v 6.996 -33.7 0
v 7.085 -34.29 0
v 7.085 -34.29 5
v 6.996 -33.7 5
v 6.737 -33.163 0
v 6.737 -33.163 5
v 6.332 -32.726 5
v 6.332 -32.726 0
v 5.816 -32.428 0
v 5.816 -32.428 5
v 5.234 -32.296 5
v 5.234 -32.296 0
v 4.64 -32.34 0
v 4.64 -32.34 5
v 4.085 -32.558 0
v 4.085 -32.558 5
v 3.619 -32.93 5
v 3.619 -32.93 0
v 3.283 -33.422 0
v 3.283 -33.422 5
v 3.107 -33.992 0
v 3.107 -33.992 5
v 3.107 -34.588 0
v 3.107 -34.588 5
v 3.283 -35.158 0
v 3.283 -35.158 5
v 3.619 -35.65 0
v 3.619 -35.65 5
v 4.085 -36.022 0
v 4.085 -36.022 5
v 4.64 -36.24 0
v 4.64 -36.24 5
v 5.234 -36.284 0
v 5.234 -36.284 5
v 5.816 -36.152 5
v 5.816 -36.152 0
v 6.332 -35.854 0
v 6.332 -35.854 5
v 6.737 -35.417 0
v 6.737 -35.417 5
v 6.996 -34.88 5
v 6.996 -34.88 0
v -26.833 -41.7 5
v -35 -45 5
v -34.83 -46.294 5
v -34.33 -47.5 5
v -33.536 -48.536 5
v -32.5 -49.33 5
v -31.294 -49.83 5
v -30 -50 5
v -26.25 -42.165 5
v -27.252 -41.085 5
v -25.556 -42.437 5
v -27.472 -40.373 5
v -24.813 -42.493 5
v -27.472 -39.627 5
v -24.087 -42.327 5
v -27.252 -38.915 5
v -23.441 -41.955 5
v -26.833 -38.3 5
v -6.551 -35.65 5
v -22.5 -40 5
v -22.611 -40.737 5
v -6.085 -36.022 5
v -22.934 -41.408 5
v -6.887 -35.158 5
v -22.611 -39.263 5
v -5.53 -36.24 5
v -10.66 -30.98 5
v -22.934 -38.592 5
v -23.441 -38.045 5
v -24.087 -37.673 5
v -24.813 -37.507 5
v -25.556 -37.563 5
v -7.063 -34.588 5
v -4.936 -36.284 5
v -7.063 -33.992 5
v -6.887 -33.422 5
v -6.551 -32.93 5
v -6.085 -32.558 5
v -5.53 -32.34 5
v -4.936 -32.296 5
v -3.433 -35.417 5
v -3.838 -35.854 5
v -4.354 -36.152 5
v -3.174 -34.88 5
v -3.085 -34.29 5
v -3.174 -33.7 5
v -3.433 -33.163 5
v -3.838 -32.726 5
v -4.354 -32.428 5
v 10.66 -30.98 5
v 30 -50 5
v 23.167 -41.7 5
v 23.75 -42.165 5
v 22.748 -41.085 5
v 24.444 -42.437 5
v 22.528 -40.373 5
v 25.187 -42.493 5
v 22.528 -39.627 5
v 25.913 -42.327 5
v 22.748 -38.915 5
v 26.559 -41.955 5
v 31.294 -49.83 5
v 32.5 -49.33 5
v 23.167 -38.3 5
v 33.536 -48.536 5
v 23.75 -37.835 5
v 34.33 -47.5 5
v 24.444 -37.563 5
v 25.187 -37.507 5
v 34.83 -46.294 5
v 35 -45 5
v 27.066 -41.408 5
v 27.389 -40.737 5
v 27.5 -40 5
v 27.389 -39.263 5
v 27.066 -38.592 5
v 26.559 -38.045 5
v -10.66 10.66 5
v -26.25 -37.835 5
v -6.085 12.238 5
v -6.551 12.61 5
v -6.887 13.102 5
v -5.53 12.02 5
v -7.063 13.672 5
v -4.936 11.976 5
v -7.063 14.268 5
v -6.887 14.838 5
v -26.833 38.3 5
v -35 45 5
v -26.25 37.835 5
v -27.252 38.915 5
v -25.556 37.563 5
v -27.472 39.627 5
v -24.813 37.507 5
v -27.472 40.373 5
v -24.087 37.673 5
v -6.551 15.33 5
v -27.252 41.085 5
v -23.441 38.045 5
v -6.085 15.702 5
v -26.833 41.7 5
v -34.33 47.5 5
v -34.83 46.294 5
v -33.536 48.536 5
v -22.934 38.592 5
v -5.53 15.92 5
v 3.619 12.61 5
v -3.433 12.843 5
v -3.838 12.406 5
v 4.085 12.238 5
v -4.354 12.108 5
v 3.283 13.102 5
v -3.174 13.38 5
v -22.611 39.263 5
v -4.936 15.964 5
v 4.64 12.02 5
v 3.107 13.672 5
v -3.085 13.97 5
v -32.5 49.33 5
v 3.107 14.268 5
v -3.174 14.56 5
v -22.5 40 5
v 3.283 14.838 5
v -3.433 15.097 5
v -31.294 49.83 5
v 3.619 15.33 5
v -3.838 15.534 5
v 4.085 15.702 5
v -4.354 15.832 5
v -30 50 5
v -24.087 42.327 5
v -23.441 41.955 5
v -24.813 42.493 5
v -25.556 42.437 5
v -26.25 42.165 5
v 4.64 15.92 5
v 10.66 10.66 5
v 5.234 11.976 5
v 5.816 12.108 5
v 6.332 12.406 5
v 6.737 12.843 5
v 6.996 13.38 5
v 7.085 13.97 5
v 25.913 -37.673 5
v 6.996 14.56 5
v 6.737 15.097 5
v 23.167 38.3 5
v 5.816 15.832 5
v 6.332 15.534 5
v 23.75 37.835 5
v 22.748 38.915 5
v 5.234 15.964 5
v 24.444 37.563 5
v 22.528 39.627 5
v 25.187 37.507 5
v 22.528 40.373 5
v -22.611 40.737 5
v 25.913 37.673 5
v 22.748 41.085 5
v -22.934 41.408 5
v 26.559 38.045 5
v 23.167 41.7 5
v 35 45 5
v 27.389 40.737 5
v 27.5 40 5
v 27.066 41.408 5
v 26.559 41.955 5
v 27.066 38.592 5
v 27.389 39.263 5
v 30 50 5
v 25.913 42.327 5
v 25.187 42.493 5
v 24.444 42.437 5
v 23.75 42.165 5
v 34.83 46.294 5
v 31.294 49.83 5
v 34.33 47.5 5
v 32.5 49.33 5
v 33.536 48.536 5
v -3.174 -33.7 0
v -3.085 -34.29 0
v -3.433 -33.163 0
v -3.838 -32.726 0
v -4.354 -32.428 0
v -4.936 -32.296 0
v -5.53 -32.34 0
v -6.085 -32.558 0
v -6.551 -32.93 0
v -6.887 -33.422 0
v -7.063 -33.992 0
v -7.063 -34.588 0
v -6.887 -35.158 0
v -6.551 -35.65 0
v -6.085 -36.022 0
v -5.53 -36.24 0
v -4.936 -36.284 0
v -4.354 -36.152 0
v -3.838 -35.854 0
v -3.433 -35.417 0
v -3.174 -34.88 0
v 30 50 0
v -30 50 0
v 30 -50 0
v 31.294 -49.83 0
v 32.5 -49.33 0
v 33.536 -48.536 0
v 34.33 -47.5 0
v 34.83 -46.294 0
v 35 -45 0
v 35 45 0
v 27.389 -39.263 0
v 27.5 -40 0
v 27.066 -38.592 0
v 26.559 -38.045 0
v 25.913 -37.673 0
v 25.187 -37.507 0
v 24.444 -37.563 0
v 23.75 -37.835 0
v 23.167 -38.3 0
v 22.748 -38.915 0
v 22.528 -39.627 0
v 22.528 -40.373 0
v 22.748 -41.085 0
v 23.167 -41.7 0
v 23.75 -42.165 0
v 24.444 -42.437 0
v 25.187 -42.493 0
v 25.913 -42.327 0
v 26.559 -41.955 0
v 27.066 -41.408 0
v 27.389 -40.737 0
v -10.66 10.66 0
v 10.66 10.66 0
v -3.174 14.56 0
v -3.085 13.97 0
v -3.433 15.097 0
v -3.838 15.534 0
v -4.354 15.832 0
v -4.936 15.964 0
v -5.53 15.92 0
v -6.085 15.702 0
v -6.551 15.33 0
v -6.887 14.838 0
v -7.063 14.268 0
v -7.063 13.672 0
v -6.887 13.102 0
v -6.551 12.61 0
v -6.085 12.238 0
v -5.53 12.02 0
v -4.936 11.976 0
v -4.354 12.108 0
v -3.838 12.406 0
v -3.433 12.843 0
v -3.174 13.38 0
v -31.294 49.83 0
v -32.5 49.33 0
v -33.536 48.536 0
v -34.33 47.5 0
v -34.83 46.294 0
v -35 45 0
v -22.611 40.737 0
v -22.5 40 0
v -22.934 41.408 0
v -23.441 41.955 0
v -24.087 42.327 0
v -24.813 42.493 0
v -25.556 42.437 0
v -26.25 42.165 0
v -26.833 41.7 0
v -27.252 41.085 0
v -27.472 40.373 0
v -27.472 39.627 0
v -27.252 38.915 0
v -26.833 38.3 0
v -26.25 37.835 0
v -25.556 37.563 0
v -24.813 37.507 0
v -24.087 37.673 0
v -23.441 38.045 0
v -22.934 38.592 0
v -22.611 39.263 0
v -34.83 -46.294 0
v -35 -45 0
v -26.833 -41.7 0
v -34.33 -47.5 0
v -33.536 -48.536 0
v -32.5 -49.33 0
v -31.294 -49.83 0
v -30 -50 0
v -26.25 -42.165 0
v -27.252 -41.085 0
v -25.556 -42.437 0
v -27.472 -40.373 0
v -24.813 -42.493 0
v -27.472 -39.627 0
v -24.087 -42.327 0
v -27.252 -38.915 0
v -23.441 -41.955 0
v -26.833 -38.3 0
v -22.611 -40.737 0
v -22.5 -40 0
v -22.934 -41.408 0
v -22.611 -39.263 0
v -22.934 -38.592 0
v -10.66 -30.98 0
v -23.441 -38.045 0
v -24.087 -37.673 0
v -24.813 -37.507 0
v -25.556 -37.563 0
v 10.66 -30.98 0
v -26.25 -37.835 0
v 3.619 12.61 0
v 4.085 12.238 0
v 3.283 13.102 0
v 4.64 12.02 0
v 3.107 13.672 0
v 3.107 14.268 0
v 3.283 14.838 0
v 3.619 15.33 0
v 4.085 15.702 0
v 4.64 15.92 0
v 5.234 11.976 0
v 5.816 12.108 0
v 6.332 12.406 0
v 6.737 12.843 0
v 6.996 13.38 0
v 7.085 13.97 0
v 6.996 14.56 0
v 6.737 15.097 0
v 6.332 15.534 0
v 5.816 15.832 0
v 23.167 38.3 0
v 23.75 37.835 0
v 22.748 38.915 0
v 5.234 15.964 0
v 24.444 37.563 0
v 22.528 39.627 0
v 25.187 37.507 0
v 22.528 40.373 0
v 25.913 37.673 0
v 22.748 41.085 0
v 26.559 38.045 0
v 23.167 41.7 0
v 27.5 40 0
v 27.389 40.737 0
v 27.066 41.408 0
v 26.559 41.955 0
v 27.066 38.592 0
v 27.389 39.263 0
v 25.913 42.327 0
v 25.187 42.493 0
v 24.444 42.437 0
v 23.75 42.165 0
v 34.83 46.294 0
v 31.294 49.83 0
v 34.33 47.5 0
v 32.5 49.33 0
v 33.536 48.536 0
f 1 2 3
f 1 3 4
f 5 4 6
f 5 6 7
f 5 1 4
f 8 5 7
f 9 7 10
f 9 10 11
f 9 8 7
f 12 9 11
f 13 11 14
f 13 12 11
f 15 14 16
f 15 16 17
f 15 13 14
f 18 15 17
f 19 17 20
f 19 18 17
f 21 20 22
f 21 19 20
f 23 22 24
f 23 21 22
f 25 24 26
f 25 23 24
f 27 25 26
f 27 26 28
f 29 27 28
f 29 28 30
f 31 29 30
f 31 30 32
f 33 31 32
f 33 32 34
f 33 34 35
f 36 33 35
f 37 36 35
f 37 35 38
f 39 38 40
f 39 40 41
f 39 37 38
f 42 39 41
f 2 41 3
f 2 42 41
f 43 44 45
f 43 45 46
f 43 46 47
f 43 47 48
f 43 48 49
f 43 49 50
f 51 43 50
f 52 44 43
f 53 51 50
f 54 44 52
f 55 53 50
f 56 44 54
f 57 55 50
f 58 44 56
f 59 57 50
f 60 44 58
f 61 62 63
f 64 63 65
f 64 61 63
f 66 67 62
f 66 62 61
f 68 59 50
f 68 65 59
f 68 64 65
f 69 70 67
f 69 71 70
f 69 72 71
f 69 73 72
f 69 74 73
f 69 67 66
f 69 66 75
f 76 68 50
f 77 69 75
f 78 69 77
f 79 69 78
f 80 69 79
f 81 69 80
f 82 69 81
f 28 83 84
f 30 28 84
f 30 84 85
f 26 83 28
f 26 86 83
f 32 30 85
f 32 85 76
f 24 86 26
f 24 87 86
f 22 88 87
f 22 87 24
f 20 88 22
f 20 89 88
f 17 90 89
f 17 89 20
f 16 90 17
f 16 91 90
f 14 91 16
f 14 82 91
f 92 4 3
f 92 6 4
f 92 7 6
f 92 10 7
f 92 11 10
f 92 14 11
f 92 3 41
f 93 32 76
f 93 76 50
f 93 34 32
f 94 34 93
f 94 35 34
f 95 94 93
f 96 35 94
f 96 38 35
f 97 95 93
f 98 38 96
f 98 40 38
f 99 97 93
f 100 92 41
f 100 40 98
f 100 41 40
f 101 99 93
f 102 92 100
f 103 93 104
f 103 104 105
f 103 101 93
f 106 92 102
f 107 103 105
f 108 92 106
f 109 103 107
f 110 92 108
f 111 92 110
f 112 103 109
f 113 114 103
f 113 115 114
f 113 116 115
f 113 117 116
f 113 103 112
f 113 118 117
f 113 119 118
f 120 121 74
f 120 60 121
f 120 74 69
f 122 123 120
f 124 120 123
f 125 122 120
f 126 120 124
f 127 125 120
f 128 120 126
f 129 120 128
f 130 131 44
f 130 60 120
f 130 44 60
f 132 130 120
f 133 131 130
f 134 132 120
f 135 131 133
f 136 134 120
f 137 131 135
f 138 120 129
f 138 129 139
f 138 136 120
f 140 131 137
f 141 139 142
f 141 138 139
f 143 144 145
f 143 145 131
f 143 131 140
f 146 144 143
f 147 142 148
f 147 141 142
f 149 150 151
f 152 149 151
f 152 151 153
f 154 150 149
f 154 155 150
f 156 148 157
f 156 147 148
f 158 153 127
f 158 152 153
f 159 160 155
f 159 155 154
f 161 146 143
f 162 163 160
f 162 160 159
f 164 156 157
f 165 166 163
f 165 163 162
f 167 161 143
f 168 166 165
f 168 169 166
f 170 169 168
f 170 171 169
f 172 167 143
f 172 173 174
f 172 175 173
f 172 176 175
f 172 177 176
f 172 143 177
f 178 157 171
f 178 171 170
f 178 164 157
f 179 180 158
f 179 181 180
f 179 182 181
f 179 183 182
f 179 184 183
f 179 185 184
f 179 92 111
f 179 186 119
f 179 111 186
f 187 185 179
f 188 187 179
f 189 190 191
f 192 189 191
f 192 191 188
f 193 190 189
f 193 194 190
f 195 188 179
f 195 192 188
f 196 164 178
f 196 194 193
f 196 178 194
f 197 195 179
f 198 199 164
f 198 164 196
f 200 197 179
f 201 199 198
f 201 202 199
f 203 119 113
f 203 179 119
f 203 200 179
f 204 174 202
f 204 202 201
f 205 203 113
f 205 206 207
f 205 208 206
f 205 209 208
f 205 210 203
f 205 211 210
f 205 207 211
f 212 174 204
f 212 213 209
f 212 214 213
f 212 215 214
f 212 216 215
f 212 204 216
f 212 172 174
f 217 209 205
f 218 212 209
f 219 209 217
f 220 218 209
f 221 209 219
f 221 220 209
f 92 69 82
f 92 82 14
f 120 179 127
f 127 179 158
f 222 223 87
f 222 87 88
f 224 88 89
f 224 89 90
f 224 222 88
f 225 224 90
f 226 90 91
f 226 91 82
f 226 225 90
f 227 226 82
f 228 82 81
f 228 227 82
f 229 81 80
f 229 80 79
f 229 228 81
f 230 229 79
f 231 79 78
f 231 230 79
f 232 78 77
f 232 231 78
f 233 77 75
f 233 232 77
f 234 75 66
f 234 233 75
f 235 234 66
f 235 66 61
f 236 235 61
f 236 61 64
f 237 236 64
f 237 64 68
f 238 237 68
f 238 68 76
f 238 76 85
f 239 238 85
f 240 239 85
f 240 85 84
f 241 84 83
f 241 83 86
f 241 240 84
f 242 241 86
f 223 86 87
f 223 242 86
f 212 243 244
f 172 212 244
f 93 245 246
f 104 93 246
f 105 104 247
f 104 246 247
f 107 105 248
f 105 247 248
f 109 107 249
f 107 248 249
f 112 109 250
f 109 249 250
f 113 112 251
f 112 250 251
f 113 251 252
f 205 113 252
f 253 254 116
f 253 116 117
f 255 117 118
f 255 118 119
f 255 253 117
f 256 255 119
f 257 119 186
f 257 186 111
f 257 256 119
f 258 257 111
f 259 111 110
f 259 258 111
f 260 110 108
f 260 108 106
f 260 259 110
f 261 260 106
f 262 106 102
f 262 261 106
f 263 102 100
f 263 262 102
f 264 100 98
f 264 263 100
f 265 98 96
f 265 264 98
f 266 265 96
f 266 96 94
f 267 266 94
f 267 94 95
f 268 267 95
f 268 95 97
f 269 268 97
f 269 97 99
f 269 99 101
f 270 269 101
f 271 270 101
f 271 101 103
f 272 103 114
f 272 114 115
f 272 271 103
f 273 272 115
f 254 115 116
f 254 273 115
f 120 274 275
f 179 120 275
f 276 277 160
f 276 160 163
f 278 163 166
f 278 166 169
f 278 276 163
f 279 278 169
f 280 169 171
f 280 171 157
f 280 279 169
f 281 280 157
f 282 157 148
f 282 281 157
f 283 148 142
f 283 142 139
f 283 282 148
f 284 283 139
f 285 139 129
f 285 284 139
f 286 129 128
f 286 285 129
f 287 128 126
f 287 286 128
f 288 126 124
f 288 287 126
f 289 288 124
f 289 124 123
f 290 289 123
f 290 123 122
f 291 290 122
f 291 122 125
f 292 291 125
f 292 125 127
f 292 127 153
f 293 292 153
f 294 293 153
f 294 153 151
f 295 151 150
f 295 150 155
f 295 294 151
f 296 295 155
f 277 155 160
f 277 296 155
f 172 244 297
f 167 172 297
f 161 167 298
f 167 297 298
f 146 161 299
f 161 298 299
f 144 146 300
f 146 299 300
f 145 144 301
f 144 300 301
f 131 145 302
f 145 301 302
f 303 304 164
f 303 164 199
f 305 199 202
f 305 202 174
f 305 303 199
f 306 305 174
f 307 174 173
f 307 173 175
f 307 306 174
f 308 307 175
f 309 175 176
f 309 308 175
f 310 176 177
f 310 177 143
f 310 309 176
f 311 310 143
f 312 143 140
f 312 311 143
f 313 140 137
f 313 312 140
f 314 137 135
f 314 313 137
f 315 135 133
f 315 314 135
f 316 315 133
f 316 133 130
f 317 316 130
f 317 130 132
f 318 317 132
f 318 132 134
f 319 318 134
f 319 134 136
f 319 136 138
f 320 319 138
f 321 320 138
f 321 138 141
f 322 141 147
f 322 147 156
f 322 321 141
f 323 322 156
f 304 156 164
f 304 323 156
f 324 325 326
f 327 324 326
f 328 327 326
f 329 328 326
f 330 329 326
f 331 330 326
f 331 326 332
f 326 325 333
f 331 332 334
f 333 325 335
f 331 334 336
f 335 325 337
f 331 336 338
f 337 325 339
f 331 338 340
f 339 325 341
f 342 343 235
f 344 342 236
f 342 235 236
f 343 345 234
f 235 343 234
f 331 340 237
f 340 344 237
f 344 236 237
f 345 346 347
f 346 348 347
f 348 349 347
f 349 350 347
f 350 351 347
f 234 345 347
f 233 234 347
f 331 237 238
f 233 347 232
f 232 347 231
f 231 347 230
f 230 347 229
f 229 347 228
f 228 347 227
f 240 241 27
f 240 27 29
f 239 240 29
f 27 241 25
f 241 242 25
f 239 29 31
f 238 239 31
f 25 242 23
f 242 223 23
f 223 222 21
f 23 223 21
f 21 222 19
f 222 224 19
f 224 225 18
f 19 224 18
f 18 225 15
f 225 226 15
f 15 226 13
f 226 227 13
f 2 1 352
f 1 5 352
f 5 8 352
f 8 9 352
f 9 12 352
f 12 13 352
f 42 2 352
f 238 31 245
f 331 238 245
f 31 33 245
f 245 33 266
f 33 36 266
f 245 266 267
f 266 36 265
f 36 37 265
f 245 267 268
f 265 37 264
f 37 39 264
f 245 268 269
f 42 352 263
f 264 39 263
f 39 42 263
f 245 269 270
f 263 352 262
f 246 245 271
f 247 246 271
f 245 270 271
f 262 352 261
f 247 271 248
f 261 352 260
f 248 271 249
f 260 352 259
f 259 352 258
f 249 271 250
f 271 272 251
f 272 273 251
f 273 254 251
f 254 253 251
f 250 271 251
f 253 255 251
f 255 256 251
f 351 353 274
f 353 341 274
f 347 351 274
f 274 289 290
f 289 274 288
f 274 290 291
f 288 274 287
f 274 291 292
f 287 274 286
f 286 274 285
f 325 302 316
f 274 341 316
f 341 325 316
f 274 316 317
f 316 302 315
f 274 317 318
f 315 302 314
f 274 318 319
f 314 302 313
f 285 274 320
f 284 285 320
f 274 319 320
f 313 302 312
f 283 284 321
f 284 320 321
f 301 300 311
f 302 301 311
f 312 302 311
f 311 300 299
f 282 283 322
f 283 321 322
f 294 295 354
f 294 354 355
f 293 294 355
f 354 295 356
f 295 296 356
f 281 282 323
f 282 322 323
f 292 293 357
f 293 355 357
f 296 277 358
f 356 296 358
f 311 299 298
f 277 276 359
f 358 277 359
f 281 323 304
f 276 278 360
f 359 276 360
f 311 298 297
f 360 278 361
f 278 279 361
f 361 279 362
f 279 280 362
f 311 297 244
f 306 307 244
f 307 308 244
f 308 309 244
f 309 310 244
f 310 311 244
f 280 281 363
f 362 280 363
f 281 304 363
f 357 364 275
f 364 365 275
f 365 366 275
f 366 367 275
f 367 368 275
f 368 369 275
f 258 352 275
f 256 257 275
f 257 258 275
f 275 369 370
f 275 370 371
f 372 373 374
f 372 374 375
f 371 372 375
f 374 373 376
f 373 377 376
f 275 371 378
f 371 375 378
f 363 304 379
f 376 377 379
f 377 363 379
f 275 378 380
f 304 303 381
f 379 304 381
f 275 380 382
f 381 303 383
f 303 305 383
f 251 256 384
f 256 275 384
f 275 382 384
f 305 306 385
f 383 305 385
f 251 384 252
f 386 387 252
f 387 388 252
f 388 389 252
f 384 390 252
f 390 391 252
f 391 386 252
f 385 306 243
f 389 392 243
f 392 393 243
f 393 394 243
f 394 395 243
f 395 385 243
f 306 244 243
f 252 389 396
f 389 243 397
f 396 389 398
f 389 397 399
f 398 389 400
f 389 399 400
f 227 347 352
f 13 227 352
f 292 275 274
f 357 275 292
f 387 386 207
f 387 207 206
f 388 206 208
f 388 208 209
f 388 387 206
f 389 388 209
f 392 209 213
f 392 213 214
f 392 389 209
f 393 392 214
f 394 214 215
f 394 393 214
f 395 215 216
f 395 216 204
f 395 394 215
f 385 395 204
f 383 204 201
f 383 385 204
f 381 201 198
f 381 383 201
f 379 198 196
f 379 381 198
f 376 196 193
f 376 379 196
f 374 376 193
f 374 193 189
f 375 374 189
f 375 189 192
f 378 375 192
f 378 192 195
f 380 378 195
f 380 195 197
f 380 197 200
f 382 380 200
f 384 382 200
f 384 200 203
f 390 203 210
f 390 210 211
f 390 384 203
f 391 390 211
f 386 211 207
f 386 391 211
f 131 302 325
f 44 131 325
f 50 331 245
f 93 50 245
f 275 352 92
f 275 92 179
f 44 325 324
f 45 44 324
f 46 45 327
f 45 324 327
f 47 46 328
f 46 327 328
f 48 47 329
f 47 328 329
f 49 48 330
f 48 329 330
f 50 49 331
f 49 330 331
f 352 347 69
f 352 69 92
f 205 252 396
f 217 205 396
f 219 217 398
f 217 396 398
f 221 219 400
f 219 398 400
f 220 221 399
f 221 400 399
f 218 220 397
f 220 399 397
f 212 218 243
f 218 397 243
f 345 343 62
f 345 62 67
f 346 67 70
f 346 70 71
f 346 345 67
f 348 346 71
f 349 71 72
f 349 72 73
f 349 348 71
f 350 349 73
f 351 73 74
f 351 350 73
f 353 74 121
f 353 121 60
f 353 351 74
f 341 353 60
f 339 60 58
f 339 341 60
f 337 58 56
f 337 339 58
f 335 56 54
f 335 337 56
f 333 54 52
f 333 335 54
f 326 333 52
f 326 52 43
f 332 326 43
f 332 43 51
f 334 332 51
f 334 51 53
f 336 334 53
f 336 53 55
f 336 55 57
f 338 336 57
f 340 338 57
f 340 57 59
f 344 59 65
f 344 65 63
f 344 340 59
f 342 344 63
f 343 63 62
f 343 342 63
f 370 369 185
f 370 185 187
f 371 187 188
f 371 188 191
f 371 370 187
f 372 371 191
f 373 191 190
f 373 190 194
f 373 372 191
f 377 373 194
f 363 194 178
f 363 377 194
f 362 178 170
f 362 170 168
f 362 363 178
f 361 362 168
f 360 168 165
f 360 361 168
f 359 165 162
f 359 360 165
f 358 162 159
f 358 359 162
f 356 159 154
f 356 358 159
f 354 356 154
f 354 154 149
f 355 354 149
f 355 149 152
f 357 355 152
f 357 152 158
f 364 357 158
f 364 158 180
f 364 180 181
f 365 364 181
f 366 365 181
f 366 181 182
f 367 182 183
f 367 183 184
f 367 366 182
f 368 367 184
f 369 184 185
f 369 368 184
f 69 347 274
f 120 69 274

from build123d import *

# Parameters (mm, degrees)
F0_R     = 2.5
F0_R_2   = 2
F0_W     = 21.32
F0_H     = 41.64
F1_DEPTH = 5


with BuildPart() as f1:
    # F0 (on Top) → F1 (new body)
    with BuildSketch(Plane.XY):
        with BuildLine():
            Line((30, 50), (-30, 50))
            ThreePointArc((-30, 50), (-33.535534, 48.535534), (-35, 45))
            Line((-35, 45), (-35, -45))
            ThreePointArc((-35, -45), (-33.535534, -48.535534), (-30, -50))
            Line((-30, -50), (30, -50))
            ThreePointArc((30, -50), (33.535534, -48.535534), (35, -45))
            Line((35, -45), (35, 45))
            ThreePointArc((35, 45), (33.535534, 48.535534), (30, 50))
        make_face()
        with Locations((-25, -40)):
            Circle(F0_R, mode=Mode.SUBTRACT)
        with Locations((-5.085, -34.29)):
            Circle(F0_R_2, mode=Mode.SUBTRACT)
        with Locations((5.085, -34.29)):
            Circle(F0_R_2, mode=Mode.SUBTRACT)
        with Locations((25, -40)):
            Circle(F0_R, mode=Mode.SUBTRACT)
        with Locations((0, -10.16)):
            Rectangle(F0_W, F0_H, mode=Mode.SUBTRACT)
        with Locations((-5.085, 13.97)):
            Circle(F0_R_2, mode=Mode.SUBTRACT)
        with Locations((-25, 40)):
            Circle(F0_R, mode=Mode.SUBTRACT)
        with Locations((5.085, 13.97)):
            Circle(F0_R_2, mode=Mode.SUBTRACT)
        with Locations((25, 40)):
            Circle(F0_R, mode=Mode.SUBTRACT)
    extrude(amount=F1_DEPTH)


solid = f1.part
